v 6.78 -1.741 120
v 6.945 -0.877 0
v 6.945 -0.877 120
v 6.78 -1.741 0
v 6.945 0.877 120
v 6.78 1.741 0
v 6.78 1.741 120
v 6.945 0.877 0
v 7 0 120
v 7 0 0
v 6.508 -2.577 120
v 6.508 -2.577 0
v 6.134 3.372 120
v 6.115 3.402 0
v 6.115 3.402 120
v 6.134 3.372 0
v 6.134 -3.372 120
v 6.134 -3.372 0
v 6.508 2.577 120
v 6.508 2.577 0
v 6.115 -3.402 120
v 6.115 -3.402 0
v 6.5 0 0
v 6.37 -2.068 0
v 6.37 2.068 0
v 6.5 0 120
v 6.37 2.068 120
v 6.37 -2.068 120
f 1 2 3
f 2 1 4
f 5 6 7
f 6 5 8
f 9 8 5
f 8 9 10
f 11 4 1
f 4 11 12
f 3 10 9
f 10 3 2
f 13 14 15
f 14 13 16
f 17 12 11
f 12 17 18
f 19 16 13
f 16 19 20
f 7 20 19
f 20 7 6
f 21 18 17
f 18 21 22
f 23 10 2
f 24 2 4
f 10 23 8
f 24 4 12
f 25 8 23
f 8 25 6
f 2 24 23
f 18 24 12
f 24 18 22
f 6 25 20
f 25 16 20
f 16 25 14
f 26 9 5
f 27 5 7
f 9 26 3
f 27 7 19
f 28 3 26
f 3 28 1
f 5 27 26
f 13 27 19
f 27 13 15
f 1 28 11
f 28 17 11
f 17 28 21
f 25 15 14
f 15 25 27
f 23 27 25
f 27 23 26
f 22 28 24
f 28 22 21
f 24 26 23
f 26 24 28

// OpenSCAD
$fn = 50;


difference() {
	union() {
		cylinder(h = 120, r = 7.0000000000);
		translate(v = [-13.0000000000, 0, 0]) {
			cylinder(h = 120, r = 7.0000000000);
		}
	}
	union() {
		cylinder(h = 120, r = 3.2500000000);
		cylinder(h = 120, r = 1.8000000000);
		cylinder(h = 120, r = 1.8000000000);
		cylinder(h = 120, r = 1.8000000000);
		translate(v = [-17.5000000000, 0, 0]) {
			hull() {
				translate(v = [-3.7500000000, 0.0000000000, 0]) {
					cylinder(h = 120, r = 10.5000000000);
				}
				translate(v = [3.7500000000, 0.0000000000, 0]) {
					cylinder(h = 120, r = 10.5000000000);
				}
				translate(v = [-3.7500000000, -0.0000000000, 0]) {
					cylinder(h = 120, r = 10.5000000000);
				}
				translate(v = [3.7500000000, -0.0000000000, 0]) {
					cylinder(h = 120, r = 10.5000000000);
				}
			}
		}
		translate(v = [-10.0000000000, 0, 0.0000000000]) {
			cylinder(h = 120, r = 16.5000000000);
		}
	}
}
